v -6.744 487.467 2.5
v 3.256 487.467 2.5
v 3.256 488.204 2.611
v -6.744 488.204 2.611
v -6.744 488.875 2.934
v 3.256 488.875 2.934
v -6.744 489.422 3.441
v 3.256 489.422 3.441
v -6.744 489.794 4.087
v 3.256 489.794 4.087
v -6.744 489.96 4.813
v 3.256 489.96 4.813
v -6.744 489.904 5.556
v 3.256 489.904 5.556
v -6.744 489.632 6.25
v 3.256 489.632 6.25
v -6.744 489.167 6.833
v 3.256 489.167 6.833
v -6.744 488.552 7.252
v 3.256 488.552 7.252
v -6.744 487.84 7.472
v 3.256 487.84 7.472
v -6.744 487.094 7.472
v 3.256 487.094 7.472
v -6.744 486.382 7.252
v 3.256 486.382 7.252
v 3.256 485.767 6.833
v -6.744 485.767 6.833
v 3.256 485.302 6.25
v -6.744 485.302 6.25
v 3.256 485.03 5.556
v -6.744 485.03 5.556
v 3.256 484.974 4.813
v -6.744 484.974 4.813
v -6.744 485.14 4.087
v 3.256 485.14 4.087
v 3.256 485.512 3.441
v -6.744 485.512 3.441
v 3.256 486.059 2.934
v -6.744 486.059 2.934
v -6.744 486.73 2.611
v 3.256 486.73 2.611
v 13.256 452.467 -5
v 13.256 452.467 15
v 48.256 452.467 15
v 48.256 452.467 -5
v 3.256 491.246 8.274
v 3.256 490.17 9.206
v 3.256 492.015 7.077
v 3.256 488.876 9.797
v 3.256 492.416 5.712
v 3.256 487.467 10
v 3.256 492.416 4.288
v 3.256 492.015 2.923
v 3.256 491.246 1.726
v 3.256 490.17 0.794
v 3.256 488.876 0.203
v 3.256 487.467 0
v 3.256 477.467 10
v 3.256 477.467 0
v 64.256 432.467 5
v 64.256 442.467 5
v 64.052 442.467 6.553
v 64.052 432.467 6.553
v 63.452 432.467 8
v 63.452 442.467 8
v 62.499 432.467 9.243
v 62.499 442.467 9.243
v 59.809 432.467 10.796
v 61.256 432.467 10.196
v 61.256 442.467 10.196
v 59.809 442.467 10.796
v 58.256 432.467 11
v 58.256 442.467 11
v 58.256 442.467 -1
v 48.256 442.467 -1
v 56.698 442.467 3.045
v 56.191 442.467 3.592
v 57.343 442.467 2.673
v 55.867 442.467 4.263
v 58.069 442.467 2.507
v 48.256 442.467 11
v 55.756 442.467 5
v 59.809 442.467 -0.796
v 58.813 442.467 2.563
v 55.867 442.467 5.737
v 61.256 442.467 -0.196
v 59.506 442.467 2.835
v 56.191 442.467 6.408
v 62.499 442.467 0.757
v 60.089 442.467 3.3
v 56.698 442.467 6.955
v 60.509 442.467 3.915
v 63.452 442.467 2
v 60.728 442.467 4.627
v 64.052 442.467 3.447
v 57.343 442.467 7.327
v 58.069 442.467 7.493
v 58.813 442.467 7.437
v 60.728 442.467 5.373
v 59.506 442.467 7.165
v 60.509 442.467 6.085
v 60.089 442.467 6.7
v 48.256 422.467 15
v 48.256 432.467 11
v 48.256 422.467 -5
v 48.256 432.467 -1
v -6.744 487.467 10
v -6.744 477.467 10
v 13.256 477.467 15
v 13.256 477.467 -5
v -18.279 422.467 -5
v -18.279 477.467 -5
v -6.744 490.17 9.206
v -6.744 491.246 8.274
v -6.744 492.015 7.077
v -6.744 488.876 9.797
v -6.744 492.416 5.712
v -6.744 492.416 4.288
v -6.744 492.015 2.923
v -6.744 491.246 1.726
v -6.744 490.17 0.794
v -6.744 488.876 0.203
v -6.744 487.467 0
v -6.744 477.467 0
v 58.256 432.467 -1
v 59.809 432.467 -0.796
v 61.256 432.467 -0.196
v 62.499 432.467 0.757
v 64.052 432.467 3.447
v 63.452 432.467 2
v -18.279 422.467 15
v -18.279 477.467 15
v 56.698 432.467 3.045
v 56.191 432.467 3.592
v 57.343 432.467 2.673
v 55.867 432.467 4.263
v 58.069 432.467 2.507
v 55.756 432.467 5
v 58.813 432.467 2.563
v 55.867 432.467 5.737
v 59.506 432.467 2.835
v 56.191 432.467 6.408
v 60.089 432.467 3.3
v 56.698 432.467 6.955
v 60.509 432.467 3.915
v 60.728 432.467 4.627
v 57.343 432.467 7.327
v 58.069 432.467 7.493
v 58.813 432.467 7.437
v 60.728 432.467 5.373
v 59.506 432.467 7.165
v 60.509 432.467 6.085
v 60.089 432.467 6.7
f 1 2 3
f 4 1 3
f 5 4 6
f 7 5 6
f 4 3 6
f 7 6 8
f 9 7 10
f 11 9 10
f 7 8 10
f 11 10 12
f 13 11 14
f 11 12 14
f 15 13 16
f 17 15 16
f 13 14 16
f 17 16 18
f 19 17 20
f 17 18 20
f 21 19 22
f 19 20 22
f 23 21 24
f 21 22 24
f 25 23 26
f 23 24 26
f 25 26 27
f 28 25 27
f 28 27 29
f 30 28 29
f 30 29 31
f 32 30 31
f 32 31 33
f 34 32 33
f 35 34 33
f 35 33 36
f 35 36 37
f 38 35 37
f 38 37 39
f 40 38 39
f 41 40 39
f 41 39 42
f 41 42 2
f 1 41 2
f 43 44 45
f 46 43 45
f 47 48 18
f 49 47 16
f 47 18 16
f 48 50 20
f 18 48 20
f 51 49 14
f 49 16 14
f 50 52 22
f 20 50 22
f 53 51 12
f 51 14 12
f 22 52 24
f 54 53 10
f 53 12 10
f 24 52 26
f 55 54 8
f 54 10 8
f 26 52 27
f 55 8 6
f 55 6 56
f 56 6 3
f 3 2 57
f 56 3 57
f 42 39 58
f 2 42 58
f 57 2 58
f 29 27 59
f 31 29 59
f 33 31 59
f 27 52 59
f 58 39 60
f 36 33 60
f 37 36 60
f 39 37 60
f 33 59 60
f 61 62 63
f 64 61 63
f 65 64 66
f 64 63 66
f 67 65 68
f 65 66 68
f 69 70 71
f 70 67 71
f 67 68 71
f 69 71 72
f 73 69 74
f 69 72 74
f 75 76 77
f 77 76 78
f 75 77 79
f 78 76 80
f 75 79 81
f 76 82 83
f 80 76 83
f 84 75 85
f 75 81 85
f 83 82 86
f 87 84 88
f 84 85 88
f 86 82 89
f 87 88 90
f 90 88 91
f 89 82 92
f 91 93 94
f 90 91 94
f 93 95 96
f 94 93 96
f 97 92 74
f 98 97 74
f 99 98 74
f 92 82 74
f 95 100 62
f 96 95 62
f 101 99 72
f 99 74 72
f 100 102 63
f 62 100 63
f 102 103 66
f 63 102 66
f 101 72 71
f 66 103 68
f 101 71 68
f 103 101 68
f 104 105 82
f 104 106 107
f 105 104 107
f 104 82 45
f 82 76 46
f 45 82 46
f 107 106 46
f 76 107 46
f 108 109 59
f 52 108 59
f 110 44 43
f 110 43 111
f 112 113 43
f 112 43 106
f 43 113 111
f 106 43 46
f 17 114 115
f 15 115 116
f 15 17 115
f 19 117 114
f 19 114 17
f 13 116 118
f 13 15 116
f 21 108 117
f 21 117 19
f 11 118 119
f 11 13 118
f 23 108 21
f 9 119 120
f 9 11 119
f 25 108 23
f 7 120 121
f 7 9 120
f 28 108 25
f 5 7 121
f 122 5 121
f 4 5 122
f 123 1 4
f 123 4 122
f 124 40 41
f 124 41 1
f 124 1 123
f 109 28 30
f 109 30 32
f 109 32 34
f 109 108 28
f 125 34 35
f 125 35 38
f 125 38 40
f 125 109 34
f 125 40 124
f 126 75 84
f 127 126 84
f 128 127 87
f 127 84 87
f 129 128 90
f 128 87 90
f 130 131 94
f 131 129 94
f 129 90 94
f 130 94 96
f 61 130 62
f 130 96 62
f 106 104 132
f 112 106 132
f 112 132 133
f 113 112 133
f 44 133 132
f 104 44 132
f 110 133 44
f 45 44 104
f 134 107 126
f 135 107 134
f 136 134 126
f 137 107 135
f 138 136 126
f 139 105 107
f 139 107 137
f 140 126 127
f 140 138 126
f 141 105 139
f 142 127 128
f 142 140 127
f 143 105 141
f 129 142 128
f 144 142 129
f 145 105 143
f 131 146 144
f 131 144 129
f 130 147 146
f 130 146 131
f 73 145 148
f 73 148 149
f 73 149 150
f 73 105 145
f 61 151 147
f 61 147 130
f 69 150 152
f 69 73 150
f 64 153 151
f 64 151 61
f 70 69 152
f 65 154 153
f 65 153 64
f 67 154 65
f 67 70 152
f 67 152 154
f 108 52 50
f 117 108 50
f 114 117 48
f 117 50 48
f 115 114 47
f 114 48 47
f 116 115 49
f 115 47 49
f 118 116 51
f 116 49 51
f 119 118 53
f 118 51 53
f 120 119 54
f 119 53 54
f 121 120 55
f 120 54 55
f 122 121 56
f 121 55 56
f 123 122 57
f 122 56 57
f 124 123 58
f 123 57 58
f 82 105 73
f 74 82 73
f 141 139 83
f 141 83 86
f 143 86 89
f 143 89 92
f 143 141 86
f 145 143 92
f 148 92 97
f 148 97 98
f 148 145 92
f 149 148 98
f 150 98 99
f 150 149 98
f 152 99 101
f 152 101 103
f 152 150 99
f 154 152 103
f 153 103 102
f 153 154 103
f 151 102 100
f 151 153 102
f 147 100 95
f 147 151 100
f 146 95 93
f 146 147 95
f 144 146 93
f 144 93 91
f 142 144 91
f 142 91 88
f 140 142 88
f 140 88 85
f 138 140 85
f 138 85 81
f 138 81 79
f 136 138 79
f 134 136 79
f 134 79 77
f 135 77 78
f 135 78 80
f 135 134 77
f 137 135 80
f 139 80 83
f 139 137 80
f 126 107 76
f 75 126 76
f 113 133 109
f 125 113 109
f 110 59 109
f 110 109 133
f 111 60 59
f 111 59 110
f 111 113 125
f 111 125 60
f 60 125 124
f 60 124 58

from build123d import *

# Parameters (mm, degrees)
SKETCH1_W           = 50
SKETCH1_H           = 40
BOSS_EXTRUDE1_DEPTH = 10
SKETCH5_W           = 6
SKETCH5_H           = 5
BOSS_EXTRUDE3_DEPTH = 10
SKETCH6_R           = 2
CUT_EXTRUDE1_DEPTH  = 20
SKETCH8_W           = 10
SKETCH8_H           = 40
CUT_EXTRUDE2_DEPTH  = 25
SKETCH9_W           = 10
SKETCH9_H           = 6
SKETCH9_R           = 1.25
BOSS_EXTRUDE4_DEPTH = 5
SKETCH10_W          = 10
SKETCH10_H          = 5
CUT_EXTRUDE3_DEPTH  = 15
SKETCH11_W          = 5
SKETCH11_H          = 5
BOSS_EXTRUDE5_DEPTH = 10
SKETCH12_R          = 1.25
CUT_EXTRUDE4_DEPTH  = 10
CUT_EXTRUDE5_DEPTH  = 10
CUT_EXTRUDE6_DEPTH  = 10
SCALE1_SCALE        = 2
SKETCH15_W          = 33.464905159
SKETCH15_H          = 55
SKETCH15_W_2        = 35
SKETCH15_H_2        = 25
CUT_EXTRUDE7_DEPTH  = 30


with BuildPart() as part:
    # Sketch1 → Boss-Extrude1 (new body)
    with BuildSketch(Plane(origin=(669.84184187, 0, 0), x_dir=(1, 0, 0), z_dir=(0, 0, 1))):
        with Locations((-671.310344828, 437.637931034)):
            Rectangle(SKETCH1_W, SKETCH1_H)
    boss_extrude1 = extrude(amount=BOSS_EXTRUDE1_DEPTH)

    # Sketch5 → Boss-Extrude3 (add)
    with BuildSketch(Plane(origin=(23.531497042, 0, 0), x_dir=(0, 0, -1), z_dir=(1, 0, 0))):
        with Locations((-5, 442.637931034)):
            Rectangle(SKETCH5_W, SKETCH5_H)
        with Locations((-5, 432.637931034)):
            Rectangle(SKETCH5_W, SKETCH5_H)
    extrude(amount=BOSS_EXTRUDE3_DEPTH)

    # Sketch6 → Cut-Extrude1 (cut)
    with BuildSketch(Plane(origin=(669.84184187, 445.137931034, 0), x_dir=(1, 0, 0), z_dir=(0, 1, 0))):
        with Locations(Location((-641.310344828, -5, 0), (0, 0, 180))):
            Circle(SKETCH6_R)
    extrude(amount=-CUT_EXTRUDE1_DEPTH, mode=Mode.SUBTRACT)

    # Sketch8 → Cut-Extrude2 (cut)
    with BuildSketch(Plane.ZY.offset(26.468502958)):
        with Locations((5, 437.637931034)):
            Rectangle(SKETCH8_W, SKETCH8_H)
    extrude(amount=-CUT_EXTRUDE2_DEPTH, mode=Mode.SUBTRACT)

    # Sketch9 → Boss-Extrude4 (add)
    with BuildSketch(Plane(origin=(0, 435.137931034, 0), x_dir=(1, 0, 0), z_dir=(0, 1, 0))):
        with Locations((28.531497042, -5)):
            Rectangle(SKETCH9_W, SKETCH9_H)
        with Locations(Location((28.531497042, -5, 0), (0, 0, 180))):
            Circle(SKETCH9_R, mode=Mode.SUBTRACT)
    extrude(amount=BOSS_EXTRUDE4_DEPTH)

    # Sketch10 → Cut-Extrude3 (cut)
    with BuildSketch(Plane.XY.offset(8)):
        with Locations((28.531497042, 432.637931034)):
            Rectangle(SKETCH10_W, SKETCH10_H)
        with Locations((28.531497042, 442.637931034)):
            Rectangle(SKETCH10_W, SKETCH10_H)
    extrude(amount=-CUT_EXTRUDE3_DEPTH, mode=Mode.SUBTRACT)

    # Mirror1: Boss-Extrude1 across plane
    add(boss_extrude1.mirror(Plane(origin=(-1.468502958, 0, 0), x_dir=(0, 0, 1), z_dir=(1, 0, 0))))

    # Sketch11 → Boss-Extrude5 (add)
    with BuildSketch(Plane(origin=(0, 457.637931034, 0), x_dir=(1, 0, 0), z_dir=(0, 1, 0))):
        with Locations((-1.468502958, -5)):
            Rectangle(SKETCH11_W, SKETCH11_H)
    extrude(amount=BOSS_EXTRUDE5_DEPTH)

    # Sketch12 → Cut-Extrude4 (cut)
    with BuildSketch(Plane(origin=(1.031497042, 0, 0), x_dir=(0, 0, -1), z_dir=(1, 0, 0))):
        with Locations((-5, 462.637931034)):
            Circle(SKETCH12_R)
    extrude(amount=-CUT_EXTRUDE4_DEPTH, mode=Mode.SUBTRACT)

    # Sketch13 → Cut-Extrude5 (cut)
    with BuildSketch(Plane(origin=(1.031497042, 0, 0), x_dir=(0, 0, -1), z_dir=(1, 0, 0))):
        with BuildLine():
            Line((-7.5, 467.637931034), (-7.5, 462.637931034))
            ThreePointArc((-7.5, 462.637931034), (-5, 465.137931034), (-2.5, 462.637931034))
            Line((-2.5, 462.637931034), (-2.5, 467.637931034))
            Line((-2.5, 467.637931034), (-7.5, 467.637931034))
        make_face()
    extrude(amount=-CUT_EXTRUDE5_DEPTH, mode=Mode.SUBTRACT)

    # Sketch14 → Cut-Extrude6 (cut)
    with BuildSketch(Plane(origin=(0, 440.137931034, 0), x_dir=(1, 0, 0), z_dir=(0, 1, 0))):
        with BuildLine():
            Line((33.531497042, -2), (28.531497042, -2))
            ThreePointArc((28.531497042, -2), (30.652817386, -2.878679656), (31.531497042, -5))
            ThreePointArc((31.531497042, -5), (30.652817386, -7.121320344), (28.531497042, -8))
            Line((28.531497042, -8), (33.531497042, -8))
            Line((33.531497042, -8), (33.531497042, -2))
        make_face()
    extrude(amount=-CUT_EXTRUDE6_DEPTH, mode=Mode.SUBTRACT)


with BuildPart() as part_1:
    # Scale1: scaled about (-1.193296494, 437.808884999, 5)
    add(part.part.scale(SCALE1_SCALE).moved(Location((1.193296494, -437.808884999, -5))))

    # Sketch15 → Cut-Extrude7 (cut)
    with BuildSketch(Plane.XY.offset(15)):
        with Locations((-35.011256843, 449.96697707)):
            Rectangle(SKETCH15_W, SKETCH15_H)
        Polygon((-51.743709422, 422.46697707), (-51.743709422, 397.46697707), (48.256290578, 397.46697707), (48.256290578, 422.46697707), (-18.278804263, 422.46697707), align=None)
        with Locations((30.756290578, 464.96697707)):
            Rectangle(SKETCH15_W_2, SKETCH15_H_2)
    extrude(amount=-CUT_EXTRUDE7_DEPTH, mode=Mode.SUBTRACT)


solid = part_1.part
